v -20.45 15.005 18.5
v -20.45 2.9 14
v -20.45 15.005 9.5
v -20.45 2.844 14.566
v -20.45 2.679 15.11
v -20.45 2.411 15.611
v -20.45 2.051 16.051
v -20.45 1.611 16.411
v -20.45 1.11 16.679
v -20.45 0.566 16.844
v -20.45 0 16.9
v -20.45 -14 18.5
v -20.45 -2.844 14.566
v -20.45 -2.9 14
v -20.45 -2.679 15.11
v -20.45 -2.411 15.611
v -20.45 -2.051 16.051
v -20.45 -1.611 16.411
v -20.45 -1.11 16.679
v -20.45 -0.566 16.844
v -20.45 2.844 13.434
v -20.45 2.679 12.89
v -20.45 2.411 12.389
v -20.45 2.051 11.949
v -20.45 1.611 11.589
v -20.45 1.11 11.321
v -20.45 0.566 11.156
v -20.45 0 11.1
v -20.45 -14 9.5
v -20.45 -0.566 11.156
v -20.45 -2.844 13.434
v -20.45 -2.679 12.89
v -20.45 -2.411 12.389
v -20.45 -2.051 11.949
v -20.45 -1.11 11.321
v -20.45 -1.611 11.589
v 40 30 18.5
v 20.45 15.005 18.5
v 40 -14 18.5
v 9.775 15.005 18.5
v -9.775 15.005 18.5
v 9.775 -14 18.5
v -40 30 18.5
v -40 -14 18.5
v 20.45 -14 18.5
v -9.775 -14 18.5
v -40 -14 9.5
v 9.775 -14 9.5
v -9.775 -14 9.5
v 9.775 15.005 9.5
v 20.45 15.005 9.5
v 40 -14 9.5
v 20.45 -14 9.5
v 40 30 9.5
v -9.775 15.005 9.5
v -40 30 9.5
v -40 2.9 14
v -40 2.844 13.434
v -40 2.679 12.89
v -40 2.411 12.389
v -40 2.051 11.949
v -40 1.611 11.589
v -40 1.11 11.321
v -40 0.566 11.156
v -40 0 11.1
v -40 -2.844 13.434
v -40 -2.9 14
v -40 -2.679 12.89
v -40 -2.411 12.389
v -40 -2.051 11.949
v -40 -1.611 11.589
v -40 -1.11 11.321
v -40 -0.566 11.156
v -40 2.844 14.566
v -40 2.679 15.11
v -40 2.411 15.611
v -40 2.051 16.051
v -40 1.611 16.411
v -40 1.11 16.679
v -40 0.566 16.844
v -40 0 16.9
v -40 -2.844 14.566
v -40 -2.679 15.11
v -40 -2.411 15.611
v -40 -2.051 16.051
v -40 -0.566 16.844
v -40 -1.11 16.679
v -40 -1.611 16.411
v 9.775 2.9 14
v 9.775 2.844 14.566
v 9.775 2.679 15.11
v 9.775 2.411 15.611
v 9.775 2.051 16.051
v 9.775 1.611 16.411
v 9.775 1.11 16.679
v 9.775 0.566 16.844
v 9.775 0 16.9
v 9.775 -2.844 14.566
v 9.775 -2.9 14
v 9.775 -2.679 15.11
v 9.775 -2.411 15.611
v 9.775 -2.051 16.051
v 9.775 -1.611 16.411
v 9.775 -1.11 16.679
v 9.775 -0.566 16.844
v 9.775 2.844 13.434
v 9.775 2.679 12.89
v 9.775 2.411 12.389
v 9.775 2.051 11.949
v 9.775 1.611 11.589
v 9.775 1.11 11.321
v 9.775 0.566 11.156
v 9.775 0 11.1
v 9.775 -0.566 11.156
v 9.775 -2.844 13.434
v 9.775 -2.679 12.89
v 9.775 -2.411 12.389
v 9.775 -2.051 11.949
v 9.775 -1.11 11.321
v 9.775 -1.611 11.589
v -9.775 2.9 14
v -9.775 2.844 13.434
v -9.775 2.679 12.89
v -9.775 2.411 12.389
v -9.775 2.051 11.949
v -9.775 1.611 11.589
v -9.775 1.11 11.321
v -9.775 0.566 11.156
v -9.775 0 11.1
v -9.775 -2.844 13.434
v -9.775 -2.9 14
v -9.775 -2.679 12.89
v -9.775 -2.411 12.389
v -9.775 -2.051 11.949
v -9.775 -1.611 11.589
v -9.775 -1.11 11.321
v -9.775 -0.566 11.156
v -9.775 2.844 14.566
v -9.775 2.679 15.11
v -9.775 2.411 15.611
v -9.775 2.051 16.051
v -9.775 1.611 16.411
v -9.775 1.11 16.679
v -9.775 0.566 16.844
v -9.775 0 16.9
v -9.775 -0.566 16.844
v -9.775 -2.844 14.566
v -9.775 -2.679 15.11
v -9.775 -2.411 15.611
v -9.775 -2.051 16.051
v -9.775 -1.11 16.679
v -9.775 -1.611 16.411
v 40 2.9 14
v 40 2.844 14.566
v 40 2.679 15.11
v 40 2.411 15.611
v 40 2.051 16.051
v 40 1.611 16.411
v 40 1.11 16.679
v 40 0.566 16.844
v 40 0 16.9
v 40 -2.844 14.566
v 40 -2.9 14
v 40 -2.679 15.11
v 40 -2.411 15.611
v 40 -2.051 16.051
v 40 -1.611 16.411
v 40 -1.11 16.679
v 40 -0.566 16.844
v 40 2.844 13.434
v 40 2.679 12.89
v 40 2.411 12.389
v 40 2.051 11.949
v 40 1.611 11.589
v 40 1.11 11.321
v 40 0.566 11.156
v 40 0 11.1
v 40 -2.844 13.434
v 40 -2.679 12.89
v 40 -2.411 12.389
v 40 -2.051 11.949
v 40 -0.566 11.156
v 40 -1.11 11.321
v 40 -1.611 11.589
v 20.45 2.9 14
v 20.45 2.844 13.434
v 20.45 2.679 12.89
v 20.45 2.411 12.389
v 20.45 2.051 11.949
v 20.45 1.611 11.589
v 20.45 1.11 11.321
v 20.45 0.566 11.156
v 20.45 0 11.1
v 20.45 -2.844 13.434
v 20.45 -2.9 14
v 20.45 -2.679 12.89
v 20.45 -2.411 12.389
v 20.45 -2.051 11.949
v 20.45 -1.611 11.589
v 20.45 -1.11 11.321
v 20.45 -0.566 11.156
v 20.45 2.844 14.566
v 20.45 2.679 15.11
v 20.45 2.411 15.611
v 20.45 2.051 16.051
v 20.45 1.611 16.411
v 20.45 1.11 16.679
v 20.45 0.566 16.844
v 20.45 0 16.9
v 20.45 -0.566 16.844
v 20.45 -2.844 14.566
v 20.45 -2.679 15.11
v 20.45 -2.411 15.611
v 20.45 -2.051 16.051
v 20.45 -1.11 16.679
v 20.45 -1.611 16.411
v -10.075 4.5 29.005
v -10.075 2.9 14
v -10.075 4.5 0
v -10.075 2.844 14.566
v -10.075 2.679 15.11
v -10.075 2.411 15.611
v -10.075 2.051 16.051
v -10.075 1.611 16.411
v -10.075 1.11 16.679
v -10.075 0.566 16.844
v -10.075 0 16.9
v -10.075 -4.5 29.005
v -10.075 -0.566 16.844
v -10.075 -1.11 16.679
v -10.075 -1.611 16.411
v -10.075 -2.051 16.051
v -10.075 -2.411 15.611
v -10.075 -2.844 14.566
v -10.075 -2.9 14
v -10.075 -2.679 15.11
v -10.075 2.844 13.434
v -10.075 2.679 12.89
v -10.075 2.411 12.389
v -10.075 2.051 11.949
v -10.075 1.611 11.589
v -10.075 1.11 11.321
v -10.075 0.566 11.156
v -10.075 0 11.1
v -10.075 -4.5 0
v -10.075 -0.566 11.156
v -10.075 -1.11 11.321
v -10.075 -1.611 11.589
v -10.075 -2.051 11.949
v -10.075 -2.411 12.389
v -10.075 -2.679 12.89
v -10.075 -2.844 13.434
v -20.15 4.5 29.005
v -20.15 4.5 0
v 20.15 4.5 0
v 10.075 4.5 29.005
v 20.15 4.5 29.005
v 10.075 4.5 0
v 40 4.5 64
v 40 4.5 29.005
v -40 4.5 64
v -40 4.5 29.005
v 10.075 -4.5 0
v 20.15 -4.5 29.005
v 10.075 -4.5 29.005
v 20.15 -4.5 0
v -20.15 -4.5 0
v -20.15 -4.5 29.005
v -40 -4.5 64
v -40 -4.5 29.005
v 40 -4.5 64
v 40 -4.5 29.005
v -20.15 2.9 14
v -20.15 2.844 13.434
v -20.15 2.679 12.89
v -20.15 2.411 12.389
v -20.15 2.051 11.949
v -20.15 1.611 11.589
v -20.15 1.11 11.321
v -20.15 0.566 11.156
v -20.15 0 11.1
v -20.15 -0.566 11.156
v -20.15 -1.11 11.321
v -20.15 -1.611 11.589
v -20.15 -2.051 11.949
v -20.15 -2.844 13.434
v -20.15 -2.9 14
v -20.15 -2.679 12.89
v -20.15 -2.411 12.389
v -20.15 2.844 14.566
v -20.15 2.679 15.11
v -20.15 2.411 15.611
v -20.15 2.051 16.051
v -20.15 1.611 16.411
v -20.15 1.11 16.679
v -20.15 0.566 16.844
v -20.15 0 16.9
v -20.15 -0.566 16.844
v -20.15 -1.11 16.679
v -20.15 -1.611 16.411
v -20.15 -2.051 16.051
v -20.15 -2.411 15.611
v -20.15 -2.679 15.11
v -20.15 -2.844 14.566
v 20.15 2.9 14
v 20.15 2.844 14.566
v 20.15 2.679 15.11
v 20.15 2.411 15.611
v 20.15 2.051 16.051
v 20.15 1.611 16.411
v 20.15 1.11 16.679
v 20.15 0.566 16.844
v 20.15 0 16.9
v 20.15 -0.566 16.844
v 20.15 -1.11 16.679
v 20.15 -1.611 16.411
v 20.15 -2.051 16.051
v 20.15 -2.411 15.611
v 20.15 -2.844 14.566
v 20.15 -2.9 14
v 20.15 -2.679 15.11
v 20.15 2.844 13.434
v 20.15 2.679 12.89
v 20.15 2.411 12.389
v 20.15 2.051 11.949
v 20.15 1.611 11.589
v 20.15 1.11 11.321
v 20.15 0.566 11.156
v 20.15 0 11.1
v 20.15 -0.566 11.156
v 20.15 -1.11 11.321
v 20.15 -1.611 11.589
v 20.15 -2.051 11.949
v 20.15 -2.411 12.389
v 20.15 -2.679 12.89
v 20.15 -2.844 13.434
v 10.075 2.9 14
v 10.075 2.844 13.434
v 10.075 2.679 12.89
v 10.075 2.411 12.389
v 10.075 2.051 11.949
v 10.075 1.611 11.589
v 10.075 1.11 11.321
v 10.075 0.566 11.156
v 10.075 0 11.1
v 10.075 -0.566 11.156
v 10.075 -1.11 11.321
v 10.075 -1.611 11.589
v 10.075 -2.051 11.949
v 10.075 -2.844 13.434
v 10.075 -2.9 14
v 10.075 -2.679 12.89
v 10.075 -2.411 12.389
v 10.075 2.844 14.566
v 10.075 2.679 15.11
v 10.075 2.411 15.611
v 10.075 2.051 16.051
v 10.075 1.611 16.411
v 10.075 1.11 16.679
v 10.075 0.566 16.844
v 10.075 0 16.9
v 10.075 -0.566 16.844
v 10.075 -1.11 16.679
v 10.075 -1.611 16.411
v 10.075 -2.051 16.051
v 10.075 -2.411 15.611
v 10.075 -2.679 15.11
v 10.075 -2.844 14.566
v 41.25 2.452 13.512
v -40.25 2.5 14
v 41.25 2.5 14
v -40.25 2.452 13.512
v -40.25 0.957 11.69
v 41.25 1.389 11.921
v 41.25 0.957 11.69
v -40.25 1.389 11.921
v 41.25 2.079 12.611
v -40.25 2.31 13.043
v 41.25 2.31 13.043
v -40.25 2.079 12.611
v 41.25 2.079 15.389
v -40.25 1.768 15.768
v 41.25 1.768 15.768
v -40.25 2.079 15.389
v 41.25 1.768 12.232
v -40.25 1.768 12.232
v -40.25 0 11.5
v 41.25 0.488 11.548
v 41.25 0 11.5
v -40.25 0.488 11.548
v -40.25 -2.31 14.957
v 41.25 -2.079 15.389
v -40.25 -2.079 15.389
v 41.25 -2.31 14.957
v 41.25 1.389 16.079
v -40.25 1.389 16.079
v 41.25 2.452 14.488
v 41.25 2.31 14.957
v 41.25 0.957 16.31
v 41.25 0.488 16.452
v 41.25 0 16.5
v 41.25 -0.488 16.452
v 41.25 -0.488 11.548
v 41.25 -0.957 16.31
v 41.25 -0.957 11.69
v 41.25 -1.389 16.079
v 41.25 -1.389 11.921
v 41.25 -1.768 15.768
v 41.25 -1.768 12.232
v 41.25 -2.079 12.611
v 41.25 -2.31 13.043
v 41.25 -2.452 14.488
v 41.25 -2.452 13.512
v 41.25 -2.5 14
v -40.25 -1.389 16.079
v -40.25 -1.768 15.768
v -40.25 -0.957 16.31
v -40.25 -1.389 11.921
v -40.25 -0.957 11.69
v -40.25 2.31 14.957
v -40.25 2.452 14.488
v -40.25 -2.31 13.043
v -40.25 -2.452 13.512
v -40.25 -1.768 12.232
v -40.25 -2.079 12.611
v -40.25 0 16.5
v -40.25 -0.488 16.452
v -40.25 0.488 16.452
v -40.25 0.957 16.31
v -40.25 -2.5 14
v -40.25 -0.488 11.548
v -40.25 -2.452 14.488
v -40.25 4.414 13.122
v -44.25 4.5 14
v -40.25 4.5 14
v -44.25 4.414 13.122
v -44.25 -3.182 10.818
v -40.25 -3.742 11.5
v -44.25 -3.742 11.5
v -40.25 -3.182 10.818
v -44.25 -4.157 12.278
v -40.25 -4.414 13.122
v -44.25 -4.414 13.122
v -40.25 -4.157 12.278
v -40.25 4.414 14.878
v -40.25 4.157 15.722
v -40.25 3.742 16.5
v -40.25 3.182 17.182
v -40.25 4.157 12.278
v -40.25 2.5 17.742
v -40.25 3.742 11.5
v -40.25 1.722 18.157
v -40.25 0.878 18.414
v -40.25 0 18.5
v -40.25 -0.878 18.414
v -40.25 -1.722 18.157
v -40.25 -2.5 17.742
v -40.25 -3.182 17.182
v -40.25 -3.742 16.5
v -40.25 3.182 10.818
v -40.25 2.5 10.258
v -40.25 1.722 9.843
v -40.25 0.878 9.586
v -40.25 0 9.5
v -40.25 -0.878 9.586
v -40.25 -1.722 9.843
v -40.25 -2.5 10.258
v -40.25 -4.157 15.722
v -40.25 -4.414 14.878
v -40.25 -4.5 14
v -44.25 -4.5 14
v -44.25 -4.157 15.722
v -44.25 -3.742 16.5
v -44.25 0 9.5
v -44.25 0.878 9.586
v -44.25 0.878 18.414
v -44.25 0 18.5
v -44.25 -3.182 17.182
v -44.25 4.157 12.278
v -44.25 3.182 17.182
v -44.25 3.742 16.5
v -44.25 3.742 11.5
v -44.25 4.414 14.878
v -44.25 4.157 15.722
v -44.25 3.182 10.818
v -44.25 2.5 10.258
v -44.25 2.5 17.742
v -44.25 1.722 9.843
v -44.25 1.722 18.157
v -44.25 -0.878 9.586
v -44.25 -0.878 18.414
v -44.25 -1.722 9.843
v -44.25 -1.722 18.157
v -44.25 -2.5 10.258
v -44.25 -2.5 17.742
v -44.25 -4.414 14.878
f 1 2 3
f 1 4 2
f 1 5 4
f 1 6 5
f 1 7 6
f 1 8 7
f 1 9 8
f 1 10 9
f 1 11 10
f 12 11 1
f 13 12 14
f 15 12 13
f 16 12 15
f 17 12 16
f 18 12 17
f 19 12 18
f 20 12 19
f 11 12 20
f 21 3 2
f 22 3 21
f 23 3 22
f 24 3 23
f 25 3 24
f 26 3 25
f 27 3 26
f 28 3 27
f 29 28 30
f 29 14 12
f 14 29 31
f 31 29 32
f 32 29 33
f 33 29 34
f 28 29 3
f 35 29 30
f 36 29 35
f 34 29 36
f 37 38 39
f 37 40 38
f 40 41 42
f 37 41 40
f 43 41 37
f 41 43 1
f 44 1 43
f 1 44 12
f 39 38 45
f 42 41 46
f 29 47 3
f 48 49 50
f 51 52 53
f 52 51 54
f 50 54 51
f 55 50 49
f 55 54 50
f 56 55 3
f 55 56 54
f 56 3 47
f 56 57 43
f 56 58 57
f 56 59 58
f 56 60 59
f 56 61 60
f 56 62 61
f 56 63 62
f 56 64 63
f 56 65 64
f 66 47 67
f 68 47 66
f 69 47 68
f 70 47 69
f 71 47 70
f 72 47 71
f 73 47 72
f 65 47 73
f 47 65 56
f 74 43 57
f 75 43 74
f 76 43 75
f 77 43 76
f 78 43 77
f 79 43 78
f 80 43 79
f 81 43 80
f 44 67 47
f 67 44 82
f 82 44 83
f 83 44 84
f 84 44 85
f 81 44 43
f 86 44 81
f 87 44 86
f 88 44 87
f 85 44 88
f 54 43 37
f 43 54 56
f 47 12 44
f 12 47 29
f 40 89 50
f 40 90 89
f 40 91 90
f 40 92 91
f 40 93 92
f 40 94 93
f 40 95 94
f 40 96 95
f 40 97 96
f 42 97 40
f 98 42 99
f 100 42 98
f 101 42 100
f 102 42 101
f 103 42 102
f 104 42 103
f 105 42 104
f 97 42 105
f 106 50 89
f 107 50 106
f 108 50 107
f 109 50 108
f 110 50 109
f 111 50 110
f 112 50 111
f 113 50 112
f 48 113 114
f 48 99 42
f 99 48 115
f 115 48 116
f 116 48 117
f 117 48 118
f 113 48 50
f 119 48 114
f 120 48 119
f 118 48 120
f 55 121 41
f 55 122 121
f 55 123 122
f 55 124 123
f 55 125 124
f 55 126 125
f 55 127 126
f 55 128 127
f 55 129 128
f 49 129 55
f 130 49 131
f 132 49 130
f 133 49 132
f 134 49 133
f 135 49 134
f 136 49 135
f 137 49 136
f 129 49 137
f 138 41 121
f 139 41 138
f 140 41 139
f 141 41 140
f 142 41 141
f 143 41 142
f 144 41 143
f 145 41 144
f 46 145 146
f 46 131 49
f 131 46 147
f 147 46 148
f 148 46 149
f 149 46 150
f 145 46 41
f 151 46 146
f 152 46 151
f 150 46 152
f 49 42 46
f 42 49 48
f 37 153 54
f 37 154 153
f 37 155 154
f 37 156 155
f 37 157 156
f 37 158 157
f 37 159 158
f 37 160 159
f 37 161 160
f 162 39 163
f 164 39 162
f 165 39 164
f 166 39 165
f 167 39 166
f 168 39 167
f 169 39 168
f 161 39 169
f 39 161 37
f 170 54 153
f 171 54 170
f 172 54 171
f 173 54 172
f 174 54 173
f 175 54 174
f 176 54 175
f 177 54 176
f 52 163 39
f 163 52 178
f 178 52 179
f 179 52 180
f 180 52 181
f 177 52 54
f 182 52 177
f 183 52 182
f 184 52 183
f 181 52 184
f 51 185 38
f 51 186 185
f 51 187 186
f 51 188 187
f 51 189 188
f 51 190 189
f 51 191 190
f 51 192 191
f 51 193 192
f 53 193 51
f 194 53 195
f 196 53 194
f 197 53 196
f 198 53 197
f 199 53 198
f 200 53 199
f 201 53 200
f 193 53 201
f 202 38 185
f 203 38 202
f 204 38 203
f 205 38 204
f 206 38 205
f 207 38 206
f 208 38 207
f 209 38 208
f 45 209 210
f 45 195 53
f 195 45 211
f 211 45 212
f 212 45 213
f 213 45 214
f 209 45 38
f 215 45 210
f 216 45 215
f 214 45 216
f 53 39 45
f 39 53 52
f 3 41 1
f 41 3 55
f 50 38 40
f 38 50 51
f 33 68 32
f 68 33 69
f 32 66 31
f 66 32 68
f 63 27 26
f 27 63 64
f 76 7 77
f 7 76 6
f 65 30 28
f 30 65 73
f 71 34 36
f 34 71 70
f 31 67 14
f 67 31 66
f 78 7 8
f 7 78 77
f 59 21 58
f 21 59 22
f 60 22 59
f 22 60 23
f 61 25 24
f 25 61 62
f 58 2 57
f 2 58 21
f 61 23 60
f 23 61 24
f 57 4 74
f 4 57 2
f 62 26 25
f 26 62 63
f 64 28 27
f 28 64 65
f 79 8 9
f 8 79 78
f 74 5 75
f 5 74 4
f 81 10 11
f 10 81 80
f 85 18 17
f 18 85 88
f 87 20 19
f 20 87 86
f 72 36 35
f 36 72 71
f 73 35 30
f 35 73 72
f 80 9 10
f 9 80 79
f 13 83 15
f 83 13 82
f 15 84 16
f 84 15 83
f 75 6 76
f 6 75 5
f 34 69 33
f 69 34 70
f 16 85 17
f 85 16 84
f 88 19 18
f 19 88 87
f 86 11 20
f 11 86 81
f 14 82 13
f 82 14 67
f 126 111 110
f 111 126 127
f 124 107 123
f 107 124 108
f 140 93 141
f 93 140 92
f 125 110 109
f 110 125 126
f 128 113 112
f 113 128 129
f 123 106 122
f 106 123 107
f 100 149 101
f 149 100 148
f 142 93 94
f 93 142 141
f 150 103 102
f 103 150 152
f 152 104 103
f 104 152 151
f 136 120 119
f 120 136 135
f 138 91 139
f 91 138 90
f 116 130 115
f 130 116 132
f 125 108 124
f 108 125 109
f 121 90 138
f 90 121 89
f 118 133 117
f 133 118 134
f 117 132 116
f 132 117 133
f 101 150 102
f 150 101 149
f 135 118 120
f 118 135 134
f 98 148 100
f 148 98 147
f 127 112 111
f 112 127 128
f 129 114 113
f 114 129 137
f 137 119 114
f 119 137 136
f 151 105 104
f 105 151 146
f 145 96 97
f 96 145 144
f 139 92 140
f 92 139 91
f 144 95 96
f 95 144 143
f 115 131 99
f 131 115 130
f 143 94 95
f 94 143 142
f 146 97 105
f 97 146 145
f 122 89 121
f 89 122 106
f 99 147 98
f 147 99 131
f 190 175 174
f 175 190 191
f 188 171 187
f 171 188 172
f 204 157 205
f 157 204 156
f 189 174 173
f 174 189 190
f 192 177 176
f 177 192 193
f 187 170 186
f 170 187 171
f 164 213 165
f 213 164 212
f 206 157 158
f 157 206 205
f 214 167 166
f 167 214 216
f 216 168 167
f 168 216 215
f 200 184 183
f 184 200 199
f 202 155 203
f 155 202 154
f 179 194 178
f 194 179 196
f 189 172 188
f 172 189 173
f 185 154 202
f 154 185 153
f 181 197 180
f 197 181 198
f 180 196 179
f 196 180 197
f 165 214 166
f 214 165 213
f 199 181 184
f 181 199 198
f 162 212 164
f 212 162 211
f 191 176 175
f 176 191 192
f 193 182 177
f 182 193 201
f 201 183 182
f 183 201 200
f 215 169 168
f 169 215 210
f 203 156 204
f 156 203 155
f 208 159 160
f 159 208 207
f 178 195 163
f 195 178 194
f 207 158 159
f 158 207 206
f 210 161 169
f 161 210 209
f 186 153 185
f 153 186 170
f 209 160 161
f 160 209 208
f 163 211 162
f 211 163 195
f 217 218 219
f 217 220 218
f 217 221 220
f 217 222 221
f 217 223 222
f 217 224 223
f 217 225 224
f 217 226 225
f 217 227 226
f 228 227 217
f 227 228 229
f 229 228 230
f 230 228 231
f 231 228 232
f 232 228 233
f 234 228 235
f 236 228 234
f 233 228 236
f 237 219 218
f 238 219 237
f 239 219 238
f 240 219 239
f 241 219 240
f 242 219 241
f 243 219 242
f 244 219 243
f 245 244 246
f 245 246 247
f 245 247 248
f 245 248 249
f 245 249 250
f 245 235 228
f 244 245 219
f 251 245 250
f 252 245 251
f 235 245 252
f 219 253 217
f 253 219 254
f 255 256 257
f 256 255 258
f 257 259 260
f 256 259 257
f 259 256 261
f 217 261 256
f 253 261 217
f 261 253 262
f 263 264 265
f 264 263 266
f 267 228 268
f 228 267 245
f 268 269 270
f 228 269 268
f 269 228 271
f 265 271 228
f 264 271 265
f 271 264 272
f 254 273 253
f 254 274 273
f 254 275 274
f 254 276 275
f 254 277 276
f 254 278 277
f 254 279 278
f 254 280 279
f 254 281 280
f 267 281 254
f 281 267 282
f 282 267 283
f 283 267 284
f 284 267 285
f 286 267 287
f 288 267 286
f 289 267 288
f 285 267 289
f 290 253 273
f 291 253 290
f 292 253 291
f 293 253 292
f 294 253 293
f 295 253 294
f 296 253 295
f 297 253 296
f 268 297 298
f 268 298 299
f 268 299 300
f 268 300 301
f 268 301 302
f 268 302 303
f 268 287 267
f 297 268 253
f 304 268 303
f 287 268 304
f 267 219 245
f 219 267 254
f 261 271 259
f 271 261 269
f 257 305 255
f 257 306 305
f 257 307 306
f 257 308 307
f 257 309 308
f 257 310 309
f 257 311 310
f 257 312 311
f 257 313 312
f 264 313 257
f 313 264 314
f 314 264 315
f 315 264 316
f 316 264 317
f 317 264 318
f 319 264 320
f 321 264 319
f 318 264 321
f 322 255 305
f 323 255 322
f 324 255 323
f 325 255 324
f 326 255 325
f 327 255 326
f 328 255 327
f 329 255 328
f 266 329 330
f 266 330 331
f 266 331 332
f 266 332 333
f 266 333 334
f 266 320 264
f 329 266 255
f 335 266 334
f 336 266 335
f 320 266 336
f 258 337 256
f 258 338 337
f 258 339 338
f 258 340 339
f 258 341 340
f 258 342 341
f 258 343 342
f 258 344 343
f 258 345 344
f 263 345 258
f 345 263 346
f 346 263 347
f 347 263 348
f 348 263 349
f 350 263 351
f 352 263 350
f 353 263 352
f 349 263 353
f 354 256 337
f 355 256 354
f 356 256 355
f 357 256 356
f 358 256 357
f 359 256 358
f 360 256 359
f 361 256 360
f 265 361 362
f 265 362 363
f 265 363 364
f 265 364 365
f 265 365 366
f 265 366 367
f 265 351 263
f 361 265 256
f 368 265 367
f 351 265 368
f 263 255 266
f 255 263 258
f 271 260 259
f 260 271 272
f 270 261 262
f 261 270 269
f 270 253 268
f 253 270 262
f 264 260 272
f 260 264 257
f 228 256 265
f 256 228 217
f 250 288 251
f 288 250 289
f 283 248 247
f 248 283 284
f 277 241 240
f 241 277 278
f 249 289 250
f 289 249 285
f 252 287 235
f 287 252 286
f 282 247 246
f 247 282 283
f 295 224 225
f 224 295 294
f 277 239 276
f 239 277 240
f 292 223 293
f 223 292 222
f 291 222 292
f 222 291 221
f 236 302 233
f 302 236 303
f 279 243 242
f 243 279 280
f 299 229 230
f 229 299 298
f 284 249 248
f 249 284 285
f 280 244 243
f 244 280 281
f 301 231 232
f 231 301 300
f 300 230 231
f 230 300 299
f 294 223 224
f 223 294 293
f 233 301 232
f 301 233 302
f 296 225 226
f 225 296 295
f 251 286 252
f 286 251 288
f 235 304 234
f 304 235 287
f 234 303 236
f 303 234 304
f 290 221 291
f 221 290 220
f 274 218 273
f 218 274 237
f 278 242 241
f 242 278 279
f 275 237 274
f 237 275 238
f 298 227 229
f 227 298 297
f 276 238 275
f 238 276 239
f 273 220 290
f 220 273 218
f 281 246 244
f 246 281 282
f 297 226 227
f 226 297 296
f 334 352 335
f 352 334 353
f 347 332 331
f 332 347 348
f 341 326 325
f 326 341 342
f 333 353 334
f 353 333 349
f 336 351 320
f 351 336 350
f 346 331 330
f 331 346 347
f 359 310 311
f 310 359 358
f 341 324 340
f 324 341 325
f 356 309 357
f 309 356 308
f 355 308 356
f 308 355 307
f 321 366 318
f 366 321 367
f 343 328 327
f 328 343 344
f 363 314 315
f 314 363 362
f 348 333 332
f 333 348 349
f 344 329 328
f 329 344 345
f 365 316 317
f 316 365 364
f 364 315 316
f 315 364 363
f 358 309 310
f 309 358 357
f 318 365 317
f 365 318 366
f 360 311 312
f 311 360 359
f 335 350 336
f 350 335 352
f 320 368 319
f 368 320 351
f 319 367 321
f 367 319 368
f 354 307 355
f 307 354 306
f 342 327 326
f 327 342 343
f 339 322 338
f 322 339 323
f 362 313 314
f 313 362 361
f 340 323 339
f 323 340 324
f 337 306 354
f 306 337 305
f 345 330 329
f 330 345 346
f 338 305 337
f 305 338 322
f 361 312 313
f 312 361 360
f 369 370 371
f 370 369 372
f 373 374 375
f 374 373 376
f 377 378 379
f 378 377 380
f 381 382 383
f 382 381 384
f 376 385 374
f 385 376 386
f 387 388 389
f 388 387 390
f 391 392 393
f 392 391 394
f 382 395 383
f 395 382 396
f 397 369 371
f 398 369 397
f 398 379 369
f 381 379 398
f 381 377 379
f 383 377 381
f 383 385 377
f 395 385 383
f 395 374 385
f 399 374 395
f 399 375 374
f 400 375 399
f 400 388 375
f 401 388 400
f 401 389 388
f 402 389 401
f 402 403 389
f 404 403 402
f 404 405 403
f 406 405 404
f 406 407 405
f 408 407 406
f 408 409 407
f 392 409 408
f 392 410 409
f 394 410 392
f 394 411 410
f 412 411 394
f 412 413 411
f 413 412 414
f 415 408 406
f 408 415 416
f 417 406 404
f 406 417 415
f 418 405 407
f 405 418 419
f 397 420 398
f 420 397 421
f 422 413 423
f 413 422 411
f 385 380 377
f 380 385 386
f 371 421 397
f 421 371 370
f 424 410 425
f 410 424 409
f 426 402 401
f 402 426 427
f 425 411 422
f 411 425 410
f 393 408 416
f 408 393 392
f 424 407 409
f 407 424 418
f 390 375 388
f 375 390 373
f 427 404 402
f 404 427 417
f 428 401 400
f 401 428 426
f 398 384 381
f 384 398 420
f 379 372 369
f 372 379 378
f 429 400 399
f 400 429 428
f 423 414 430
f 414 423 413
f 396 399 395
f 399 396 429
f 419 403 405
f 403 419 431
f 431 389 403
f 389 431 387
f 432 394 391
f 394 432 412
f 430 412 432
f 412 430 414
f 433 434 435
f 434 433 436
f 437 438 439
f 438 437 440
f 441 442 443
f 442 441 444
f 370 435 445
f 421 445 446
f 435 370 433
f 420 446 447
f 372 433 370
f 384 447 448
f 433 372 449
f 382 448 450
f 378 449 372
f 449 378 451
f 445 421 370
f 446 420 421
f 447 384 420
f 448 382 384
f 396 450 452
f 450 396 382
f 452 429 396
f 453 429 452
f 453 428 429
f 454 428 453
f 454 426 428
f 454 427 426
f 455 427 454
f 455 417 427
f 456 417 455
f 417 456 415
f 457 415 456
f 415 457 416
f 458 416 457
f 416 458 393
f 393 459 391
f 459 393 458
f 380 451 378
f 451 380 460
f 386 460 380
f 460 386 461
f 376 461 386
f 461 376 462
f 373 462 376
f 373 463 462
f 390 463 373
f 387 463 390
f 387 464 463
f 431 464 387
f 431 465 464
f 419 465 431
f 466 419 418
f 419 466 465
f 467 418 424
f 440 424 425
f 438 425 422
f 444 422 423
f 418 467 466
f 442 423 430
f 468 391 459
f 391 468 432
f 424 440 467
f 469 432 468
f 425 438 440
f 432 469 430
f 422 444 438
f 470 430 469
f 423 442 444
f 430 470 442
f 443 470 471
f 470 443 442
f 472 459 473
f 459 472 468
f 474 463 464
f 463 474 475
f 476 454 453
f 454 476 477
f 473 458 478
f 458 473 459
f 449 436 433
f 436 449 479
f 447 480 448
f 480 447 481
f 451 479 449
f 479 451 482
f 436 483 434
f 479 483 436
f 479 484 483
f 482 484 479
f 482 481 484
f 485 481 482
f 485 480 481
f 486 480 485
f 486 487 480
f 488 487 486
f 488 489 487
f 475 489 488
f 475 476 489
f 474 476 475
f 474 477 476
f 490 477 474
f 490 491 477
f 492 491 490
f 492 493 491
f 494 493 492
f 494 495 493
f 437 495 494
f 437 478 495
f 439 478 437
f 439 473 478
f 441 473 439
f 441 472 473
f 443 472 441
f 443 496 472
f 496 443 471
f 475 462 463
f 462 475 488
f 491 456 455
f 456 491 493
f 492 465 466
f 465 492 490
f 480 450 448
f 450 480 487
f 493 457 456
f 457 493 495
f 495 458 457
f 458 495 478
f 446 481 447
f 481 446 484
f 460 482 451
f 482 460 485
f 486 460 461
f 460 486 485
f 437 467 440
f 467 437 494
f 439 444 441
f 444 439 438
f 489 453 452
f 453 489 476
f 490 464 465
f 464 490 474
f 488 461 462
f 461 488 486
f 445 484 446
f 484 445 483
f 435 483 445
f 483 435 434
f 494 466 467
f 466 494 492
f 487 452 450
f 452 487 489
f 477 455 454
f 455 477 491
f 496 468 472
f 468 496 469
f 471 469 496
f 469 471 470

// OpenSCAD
$fn = 32;

// ------------------------------------------------------------------------
// Butt hinge: hinge 80 mm, leaf swung 270 deg
// Every part is its own module, assembly() places every instance.
// ------------------------------------------------------------------------

// --- part 1 ---
module hinge_base() {
  difference() {
    union() {
      translate([-40, -14, -4.5]) cube([19.55, 44, 9]);
      translate([-9.775, -14, -4.5]) cube([19.55, 44, 9]);
      translate([20.45, -14, -4.5]) cube([19.55, 44, 9]);
      translate([-40, 15.005, -4.5]) cube([80, 14.995, 9]);
    }
    translate([-30.225, 0, 0]) rotate([0, 90, 0]) cylinder(h = 21.55, d = 5.8, center = true);
    translate([0, 0, 0]) rotate([0, 90, 0]) cylinder(h = 21.55, d = 5.8, center = true);
    translate([30.225, 0, 0]) rotate([0, 90, 0]) cylinder(h = 21.55, d = 5.8, center = true);
  }
}

// --- part 2 ---
module hinge_mover() {
  difference() {
    union() {
      translate([-20.15, -50, -4.5]) cube([10.075, 64, 9]);
      translate([10.075, -50, -4.5]) cube([10.075, 64, 9]);
      translate([-40, -50, -4.5]) cube([80, 34.995, 9]);
    }
    translate([-15.113, 0, 0]) rotate([0, 90, 0]) cylinder(h = 12.075, d = 5.8, center = true);
    translate([15.113, 0, 0]) rotate([0, 90, 0]) cylinder(h = 12.075, d = 5.8, center = true);
  }
}

// --- part 3 ---
module hinge_pin() {
  rotate([0, 90, 0]) cylinder(h = 82.5, d = 5, center = true);
  translate([-44.25, 0, 0]) rotate([0, 90, 0]) cylinder(h = 4, d = 9);
}

// --- assembly ---
module assembly() {
  color([0.80, 0.24, 0.20]) translate([0, 0, 14]) rotate([0, 0, 0]) hinge_base();
  color([0.20, 0.45, 0.75]) translate([0, 0, 14]) rotate([270, 0, 0]) hinge_mover();
  color([0.25, 0.62, 0.32]) translate([0, 0, 14]) rotate([0, 0, 0]) hinge_pin();
}

assembly();
